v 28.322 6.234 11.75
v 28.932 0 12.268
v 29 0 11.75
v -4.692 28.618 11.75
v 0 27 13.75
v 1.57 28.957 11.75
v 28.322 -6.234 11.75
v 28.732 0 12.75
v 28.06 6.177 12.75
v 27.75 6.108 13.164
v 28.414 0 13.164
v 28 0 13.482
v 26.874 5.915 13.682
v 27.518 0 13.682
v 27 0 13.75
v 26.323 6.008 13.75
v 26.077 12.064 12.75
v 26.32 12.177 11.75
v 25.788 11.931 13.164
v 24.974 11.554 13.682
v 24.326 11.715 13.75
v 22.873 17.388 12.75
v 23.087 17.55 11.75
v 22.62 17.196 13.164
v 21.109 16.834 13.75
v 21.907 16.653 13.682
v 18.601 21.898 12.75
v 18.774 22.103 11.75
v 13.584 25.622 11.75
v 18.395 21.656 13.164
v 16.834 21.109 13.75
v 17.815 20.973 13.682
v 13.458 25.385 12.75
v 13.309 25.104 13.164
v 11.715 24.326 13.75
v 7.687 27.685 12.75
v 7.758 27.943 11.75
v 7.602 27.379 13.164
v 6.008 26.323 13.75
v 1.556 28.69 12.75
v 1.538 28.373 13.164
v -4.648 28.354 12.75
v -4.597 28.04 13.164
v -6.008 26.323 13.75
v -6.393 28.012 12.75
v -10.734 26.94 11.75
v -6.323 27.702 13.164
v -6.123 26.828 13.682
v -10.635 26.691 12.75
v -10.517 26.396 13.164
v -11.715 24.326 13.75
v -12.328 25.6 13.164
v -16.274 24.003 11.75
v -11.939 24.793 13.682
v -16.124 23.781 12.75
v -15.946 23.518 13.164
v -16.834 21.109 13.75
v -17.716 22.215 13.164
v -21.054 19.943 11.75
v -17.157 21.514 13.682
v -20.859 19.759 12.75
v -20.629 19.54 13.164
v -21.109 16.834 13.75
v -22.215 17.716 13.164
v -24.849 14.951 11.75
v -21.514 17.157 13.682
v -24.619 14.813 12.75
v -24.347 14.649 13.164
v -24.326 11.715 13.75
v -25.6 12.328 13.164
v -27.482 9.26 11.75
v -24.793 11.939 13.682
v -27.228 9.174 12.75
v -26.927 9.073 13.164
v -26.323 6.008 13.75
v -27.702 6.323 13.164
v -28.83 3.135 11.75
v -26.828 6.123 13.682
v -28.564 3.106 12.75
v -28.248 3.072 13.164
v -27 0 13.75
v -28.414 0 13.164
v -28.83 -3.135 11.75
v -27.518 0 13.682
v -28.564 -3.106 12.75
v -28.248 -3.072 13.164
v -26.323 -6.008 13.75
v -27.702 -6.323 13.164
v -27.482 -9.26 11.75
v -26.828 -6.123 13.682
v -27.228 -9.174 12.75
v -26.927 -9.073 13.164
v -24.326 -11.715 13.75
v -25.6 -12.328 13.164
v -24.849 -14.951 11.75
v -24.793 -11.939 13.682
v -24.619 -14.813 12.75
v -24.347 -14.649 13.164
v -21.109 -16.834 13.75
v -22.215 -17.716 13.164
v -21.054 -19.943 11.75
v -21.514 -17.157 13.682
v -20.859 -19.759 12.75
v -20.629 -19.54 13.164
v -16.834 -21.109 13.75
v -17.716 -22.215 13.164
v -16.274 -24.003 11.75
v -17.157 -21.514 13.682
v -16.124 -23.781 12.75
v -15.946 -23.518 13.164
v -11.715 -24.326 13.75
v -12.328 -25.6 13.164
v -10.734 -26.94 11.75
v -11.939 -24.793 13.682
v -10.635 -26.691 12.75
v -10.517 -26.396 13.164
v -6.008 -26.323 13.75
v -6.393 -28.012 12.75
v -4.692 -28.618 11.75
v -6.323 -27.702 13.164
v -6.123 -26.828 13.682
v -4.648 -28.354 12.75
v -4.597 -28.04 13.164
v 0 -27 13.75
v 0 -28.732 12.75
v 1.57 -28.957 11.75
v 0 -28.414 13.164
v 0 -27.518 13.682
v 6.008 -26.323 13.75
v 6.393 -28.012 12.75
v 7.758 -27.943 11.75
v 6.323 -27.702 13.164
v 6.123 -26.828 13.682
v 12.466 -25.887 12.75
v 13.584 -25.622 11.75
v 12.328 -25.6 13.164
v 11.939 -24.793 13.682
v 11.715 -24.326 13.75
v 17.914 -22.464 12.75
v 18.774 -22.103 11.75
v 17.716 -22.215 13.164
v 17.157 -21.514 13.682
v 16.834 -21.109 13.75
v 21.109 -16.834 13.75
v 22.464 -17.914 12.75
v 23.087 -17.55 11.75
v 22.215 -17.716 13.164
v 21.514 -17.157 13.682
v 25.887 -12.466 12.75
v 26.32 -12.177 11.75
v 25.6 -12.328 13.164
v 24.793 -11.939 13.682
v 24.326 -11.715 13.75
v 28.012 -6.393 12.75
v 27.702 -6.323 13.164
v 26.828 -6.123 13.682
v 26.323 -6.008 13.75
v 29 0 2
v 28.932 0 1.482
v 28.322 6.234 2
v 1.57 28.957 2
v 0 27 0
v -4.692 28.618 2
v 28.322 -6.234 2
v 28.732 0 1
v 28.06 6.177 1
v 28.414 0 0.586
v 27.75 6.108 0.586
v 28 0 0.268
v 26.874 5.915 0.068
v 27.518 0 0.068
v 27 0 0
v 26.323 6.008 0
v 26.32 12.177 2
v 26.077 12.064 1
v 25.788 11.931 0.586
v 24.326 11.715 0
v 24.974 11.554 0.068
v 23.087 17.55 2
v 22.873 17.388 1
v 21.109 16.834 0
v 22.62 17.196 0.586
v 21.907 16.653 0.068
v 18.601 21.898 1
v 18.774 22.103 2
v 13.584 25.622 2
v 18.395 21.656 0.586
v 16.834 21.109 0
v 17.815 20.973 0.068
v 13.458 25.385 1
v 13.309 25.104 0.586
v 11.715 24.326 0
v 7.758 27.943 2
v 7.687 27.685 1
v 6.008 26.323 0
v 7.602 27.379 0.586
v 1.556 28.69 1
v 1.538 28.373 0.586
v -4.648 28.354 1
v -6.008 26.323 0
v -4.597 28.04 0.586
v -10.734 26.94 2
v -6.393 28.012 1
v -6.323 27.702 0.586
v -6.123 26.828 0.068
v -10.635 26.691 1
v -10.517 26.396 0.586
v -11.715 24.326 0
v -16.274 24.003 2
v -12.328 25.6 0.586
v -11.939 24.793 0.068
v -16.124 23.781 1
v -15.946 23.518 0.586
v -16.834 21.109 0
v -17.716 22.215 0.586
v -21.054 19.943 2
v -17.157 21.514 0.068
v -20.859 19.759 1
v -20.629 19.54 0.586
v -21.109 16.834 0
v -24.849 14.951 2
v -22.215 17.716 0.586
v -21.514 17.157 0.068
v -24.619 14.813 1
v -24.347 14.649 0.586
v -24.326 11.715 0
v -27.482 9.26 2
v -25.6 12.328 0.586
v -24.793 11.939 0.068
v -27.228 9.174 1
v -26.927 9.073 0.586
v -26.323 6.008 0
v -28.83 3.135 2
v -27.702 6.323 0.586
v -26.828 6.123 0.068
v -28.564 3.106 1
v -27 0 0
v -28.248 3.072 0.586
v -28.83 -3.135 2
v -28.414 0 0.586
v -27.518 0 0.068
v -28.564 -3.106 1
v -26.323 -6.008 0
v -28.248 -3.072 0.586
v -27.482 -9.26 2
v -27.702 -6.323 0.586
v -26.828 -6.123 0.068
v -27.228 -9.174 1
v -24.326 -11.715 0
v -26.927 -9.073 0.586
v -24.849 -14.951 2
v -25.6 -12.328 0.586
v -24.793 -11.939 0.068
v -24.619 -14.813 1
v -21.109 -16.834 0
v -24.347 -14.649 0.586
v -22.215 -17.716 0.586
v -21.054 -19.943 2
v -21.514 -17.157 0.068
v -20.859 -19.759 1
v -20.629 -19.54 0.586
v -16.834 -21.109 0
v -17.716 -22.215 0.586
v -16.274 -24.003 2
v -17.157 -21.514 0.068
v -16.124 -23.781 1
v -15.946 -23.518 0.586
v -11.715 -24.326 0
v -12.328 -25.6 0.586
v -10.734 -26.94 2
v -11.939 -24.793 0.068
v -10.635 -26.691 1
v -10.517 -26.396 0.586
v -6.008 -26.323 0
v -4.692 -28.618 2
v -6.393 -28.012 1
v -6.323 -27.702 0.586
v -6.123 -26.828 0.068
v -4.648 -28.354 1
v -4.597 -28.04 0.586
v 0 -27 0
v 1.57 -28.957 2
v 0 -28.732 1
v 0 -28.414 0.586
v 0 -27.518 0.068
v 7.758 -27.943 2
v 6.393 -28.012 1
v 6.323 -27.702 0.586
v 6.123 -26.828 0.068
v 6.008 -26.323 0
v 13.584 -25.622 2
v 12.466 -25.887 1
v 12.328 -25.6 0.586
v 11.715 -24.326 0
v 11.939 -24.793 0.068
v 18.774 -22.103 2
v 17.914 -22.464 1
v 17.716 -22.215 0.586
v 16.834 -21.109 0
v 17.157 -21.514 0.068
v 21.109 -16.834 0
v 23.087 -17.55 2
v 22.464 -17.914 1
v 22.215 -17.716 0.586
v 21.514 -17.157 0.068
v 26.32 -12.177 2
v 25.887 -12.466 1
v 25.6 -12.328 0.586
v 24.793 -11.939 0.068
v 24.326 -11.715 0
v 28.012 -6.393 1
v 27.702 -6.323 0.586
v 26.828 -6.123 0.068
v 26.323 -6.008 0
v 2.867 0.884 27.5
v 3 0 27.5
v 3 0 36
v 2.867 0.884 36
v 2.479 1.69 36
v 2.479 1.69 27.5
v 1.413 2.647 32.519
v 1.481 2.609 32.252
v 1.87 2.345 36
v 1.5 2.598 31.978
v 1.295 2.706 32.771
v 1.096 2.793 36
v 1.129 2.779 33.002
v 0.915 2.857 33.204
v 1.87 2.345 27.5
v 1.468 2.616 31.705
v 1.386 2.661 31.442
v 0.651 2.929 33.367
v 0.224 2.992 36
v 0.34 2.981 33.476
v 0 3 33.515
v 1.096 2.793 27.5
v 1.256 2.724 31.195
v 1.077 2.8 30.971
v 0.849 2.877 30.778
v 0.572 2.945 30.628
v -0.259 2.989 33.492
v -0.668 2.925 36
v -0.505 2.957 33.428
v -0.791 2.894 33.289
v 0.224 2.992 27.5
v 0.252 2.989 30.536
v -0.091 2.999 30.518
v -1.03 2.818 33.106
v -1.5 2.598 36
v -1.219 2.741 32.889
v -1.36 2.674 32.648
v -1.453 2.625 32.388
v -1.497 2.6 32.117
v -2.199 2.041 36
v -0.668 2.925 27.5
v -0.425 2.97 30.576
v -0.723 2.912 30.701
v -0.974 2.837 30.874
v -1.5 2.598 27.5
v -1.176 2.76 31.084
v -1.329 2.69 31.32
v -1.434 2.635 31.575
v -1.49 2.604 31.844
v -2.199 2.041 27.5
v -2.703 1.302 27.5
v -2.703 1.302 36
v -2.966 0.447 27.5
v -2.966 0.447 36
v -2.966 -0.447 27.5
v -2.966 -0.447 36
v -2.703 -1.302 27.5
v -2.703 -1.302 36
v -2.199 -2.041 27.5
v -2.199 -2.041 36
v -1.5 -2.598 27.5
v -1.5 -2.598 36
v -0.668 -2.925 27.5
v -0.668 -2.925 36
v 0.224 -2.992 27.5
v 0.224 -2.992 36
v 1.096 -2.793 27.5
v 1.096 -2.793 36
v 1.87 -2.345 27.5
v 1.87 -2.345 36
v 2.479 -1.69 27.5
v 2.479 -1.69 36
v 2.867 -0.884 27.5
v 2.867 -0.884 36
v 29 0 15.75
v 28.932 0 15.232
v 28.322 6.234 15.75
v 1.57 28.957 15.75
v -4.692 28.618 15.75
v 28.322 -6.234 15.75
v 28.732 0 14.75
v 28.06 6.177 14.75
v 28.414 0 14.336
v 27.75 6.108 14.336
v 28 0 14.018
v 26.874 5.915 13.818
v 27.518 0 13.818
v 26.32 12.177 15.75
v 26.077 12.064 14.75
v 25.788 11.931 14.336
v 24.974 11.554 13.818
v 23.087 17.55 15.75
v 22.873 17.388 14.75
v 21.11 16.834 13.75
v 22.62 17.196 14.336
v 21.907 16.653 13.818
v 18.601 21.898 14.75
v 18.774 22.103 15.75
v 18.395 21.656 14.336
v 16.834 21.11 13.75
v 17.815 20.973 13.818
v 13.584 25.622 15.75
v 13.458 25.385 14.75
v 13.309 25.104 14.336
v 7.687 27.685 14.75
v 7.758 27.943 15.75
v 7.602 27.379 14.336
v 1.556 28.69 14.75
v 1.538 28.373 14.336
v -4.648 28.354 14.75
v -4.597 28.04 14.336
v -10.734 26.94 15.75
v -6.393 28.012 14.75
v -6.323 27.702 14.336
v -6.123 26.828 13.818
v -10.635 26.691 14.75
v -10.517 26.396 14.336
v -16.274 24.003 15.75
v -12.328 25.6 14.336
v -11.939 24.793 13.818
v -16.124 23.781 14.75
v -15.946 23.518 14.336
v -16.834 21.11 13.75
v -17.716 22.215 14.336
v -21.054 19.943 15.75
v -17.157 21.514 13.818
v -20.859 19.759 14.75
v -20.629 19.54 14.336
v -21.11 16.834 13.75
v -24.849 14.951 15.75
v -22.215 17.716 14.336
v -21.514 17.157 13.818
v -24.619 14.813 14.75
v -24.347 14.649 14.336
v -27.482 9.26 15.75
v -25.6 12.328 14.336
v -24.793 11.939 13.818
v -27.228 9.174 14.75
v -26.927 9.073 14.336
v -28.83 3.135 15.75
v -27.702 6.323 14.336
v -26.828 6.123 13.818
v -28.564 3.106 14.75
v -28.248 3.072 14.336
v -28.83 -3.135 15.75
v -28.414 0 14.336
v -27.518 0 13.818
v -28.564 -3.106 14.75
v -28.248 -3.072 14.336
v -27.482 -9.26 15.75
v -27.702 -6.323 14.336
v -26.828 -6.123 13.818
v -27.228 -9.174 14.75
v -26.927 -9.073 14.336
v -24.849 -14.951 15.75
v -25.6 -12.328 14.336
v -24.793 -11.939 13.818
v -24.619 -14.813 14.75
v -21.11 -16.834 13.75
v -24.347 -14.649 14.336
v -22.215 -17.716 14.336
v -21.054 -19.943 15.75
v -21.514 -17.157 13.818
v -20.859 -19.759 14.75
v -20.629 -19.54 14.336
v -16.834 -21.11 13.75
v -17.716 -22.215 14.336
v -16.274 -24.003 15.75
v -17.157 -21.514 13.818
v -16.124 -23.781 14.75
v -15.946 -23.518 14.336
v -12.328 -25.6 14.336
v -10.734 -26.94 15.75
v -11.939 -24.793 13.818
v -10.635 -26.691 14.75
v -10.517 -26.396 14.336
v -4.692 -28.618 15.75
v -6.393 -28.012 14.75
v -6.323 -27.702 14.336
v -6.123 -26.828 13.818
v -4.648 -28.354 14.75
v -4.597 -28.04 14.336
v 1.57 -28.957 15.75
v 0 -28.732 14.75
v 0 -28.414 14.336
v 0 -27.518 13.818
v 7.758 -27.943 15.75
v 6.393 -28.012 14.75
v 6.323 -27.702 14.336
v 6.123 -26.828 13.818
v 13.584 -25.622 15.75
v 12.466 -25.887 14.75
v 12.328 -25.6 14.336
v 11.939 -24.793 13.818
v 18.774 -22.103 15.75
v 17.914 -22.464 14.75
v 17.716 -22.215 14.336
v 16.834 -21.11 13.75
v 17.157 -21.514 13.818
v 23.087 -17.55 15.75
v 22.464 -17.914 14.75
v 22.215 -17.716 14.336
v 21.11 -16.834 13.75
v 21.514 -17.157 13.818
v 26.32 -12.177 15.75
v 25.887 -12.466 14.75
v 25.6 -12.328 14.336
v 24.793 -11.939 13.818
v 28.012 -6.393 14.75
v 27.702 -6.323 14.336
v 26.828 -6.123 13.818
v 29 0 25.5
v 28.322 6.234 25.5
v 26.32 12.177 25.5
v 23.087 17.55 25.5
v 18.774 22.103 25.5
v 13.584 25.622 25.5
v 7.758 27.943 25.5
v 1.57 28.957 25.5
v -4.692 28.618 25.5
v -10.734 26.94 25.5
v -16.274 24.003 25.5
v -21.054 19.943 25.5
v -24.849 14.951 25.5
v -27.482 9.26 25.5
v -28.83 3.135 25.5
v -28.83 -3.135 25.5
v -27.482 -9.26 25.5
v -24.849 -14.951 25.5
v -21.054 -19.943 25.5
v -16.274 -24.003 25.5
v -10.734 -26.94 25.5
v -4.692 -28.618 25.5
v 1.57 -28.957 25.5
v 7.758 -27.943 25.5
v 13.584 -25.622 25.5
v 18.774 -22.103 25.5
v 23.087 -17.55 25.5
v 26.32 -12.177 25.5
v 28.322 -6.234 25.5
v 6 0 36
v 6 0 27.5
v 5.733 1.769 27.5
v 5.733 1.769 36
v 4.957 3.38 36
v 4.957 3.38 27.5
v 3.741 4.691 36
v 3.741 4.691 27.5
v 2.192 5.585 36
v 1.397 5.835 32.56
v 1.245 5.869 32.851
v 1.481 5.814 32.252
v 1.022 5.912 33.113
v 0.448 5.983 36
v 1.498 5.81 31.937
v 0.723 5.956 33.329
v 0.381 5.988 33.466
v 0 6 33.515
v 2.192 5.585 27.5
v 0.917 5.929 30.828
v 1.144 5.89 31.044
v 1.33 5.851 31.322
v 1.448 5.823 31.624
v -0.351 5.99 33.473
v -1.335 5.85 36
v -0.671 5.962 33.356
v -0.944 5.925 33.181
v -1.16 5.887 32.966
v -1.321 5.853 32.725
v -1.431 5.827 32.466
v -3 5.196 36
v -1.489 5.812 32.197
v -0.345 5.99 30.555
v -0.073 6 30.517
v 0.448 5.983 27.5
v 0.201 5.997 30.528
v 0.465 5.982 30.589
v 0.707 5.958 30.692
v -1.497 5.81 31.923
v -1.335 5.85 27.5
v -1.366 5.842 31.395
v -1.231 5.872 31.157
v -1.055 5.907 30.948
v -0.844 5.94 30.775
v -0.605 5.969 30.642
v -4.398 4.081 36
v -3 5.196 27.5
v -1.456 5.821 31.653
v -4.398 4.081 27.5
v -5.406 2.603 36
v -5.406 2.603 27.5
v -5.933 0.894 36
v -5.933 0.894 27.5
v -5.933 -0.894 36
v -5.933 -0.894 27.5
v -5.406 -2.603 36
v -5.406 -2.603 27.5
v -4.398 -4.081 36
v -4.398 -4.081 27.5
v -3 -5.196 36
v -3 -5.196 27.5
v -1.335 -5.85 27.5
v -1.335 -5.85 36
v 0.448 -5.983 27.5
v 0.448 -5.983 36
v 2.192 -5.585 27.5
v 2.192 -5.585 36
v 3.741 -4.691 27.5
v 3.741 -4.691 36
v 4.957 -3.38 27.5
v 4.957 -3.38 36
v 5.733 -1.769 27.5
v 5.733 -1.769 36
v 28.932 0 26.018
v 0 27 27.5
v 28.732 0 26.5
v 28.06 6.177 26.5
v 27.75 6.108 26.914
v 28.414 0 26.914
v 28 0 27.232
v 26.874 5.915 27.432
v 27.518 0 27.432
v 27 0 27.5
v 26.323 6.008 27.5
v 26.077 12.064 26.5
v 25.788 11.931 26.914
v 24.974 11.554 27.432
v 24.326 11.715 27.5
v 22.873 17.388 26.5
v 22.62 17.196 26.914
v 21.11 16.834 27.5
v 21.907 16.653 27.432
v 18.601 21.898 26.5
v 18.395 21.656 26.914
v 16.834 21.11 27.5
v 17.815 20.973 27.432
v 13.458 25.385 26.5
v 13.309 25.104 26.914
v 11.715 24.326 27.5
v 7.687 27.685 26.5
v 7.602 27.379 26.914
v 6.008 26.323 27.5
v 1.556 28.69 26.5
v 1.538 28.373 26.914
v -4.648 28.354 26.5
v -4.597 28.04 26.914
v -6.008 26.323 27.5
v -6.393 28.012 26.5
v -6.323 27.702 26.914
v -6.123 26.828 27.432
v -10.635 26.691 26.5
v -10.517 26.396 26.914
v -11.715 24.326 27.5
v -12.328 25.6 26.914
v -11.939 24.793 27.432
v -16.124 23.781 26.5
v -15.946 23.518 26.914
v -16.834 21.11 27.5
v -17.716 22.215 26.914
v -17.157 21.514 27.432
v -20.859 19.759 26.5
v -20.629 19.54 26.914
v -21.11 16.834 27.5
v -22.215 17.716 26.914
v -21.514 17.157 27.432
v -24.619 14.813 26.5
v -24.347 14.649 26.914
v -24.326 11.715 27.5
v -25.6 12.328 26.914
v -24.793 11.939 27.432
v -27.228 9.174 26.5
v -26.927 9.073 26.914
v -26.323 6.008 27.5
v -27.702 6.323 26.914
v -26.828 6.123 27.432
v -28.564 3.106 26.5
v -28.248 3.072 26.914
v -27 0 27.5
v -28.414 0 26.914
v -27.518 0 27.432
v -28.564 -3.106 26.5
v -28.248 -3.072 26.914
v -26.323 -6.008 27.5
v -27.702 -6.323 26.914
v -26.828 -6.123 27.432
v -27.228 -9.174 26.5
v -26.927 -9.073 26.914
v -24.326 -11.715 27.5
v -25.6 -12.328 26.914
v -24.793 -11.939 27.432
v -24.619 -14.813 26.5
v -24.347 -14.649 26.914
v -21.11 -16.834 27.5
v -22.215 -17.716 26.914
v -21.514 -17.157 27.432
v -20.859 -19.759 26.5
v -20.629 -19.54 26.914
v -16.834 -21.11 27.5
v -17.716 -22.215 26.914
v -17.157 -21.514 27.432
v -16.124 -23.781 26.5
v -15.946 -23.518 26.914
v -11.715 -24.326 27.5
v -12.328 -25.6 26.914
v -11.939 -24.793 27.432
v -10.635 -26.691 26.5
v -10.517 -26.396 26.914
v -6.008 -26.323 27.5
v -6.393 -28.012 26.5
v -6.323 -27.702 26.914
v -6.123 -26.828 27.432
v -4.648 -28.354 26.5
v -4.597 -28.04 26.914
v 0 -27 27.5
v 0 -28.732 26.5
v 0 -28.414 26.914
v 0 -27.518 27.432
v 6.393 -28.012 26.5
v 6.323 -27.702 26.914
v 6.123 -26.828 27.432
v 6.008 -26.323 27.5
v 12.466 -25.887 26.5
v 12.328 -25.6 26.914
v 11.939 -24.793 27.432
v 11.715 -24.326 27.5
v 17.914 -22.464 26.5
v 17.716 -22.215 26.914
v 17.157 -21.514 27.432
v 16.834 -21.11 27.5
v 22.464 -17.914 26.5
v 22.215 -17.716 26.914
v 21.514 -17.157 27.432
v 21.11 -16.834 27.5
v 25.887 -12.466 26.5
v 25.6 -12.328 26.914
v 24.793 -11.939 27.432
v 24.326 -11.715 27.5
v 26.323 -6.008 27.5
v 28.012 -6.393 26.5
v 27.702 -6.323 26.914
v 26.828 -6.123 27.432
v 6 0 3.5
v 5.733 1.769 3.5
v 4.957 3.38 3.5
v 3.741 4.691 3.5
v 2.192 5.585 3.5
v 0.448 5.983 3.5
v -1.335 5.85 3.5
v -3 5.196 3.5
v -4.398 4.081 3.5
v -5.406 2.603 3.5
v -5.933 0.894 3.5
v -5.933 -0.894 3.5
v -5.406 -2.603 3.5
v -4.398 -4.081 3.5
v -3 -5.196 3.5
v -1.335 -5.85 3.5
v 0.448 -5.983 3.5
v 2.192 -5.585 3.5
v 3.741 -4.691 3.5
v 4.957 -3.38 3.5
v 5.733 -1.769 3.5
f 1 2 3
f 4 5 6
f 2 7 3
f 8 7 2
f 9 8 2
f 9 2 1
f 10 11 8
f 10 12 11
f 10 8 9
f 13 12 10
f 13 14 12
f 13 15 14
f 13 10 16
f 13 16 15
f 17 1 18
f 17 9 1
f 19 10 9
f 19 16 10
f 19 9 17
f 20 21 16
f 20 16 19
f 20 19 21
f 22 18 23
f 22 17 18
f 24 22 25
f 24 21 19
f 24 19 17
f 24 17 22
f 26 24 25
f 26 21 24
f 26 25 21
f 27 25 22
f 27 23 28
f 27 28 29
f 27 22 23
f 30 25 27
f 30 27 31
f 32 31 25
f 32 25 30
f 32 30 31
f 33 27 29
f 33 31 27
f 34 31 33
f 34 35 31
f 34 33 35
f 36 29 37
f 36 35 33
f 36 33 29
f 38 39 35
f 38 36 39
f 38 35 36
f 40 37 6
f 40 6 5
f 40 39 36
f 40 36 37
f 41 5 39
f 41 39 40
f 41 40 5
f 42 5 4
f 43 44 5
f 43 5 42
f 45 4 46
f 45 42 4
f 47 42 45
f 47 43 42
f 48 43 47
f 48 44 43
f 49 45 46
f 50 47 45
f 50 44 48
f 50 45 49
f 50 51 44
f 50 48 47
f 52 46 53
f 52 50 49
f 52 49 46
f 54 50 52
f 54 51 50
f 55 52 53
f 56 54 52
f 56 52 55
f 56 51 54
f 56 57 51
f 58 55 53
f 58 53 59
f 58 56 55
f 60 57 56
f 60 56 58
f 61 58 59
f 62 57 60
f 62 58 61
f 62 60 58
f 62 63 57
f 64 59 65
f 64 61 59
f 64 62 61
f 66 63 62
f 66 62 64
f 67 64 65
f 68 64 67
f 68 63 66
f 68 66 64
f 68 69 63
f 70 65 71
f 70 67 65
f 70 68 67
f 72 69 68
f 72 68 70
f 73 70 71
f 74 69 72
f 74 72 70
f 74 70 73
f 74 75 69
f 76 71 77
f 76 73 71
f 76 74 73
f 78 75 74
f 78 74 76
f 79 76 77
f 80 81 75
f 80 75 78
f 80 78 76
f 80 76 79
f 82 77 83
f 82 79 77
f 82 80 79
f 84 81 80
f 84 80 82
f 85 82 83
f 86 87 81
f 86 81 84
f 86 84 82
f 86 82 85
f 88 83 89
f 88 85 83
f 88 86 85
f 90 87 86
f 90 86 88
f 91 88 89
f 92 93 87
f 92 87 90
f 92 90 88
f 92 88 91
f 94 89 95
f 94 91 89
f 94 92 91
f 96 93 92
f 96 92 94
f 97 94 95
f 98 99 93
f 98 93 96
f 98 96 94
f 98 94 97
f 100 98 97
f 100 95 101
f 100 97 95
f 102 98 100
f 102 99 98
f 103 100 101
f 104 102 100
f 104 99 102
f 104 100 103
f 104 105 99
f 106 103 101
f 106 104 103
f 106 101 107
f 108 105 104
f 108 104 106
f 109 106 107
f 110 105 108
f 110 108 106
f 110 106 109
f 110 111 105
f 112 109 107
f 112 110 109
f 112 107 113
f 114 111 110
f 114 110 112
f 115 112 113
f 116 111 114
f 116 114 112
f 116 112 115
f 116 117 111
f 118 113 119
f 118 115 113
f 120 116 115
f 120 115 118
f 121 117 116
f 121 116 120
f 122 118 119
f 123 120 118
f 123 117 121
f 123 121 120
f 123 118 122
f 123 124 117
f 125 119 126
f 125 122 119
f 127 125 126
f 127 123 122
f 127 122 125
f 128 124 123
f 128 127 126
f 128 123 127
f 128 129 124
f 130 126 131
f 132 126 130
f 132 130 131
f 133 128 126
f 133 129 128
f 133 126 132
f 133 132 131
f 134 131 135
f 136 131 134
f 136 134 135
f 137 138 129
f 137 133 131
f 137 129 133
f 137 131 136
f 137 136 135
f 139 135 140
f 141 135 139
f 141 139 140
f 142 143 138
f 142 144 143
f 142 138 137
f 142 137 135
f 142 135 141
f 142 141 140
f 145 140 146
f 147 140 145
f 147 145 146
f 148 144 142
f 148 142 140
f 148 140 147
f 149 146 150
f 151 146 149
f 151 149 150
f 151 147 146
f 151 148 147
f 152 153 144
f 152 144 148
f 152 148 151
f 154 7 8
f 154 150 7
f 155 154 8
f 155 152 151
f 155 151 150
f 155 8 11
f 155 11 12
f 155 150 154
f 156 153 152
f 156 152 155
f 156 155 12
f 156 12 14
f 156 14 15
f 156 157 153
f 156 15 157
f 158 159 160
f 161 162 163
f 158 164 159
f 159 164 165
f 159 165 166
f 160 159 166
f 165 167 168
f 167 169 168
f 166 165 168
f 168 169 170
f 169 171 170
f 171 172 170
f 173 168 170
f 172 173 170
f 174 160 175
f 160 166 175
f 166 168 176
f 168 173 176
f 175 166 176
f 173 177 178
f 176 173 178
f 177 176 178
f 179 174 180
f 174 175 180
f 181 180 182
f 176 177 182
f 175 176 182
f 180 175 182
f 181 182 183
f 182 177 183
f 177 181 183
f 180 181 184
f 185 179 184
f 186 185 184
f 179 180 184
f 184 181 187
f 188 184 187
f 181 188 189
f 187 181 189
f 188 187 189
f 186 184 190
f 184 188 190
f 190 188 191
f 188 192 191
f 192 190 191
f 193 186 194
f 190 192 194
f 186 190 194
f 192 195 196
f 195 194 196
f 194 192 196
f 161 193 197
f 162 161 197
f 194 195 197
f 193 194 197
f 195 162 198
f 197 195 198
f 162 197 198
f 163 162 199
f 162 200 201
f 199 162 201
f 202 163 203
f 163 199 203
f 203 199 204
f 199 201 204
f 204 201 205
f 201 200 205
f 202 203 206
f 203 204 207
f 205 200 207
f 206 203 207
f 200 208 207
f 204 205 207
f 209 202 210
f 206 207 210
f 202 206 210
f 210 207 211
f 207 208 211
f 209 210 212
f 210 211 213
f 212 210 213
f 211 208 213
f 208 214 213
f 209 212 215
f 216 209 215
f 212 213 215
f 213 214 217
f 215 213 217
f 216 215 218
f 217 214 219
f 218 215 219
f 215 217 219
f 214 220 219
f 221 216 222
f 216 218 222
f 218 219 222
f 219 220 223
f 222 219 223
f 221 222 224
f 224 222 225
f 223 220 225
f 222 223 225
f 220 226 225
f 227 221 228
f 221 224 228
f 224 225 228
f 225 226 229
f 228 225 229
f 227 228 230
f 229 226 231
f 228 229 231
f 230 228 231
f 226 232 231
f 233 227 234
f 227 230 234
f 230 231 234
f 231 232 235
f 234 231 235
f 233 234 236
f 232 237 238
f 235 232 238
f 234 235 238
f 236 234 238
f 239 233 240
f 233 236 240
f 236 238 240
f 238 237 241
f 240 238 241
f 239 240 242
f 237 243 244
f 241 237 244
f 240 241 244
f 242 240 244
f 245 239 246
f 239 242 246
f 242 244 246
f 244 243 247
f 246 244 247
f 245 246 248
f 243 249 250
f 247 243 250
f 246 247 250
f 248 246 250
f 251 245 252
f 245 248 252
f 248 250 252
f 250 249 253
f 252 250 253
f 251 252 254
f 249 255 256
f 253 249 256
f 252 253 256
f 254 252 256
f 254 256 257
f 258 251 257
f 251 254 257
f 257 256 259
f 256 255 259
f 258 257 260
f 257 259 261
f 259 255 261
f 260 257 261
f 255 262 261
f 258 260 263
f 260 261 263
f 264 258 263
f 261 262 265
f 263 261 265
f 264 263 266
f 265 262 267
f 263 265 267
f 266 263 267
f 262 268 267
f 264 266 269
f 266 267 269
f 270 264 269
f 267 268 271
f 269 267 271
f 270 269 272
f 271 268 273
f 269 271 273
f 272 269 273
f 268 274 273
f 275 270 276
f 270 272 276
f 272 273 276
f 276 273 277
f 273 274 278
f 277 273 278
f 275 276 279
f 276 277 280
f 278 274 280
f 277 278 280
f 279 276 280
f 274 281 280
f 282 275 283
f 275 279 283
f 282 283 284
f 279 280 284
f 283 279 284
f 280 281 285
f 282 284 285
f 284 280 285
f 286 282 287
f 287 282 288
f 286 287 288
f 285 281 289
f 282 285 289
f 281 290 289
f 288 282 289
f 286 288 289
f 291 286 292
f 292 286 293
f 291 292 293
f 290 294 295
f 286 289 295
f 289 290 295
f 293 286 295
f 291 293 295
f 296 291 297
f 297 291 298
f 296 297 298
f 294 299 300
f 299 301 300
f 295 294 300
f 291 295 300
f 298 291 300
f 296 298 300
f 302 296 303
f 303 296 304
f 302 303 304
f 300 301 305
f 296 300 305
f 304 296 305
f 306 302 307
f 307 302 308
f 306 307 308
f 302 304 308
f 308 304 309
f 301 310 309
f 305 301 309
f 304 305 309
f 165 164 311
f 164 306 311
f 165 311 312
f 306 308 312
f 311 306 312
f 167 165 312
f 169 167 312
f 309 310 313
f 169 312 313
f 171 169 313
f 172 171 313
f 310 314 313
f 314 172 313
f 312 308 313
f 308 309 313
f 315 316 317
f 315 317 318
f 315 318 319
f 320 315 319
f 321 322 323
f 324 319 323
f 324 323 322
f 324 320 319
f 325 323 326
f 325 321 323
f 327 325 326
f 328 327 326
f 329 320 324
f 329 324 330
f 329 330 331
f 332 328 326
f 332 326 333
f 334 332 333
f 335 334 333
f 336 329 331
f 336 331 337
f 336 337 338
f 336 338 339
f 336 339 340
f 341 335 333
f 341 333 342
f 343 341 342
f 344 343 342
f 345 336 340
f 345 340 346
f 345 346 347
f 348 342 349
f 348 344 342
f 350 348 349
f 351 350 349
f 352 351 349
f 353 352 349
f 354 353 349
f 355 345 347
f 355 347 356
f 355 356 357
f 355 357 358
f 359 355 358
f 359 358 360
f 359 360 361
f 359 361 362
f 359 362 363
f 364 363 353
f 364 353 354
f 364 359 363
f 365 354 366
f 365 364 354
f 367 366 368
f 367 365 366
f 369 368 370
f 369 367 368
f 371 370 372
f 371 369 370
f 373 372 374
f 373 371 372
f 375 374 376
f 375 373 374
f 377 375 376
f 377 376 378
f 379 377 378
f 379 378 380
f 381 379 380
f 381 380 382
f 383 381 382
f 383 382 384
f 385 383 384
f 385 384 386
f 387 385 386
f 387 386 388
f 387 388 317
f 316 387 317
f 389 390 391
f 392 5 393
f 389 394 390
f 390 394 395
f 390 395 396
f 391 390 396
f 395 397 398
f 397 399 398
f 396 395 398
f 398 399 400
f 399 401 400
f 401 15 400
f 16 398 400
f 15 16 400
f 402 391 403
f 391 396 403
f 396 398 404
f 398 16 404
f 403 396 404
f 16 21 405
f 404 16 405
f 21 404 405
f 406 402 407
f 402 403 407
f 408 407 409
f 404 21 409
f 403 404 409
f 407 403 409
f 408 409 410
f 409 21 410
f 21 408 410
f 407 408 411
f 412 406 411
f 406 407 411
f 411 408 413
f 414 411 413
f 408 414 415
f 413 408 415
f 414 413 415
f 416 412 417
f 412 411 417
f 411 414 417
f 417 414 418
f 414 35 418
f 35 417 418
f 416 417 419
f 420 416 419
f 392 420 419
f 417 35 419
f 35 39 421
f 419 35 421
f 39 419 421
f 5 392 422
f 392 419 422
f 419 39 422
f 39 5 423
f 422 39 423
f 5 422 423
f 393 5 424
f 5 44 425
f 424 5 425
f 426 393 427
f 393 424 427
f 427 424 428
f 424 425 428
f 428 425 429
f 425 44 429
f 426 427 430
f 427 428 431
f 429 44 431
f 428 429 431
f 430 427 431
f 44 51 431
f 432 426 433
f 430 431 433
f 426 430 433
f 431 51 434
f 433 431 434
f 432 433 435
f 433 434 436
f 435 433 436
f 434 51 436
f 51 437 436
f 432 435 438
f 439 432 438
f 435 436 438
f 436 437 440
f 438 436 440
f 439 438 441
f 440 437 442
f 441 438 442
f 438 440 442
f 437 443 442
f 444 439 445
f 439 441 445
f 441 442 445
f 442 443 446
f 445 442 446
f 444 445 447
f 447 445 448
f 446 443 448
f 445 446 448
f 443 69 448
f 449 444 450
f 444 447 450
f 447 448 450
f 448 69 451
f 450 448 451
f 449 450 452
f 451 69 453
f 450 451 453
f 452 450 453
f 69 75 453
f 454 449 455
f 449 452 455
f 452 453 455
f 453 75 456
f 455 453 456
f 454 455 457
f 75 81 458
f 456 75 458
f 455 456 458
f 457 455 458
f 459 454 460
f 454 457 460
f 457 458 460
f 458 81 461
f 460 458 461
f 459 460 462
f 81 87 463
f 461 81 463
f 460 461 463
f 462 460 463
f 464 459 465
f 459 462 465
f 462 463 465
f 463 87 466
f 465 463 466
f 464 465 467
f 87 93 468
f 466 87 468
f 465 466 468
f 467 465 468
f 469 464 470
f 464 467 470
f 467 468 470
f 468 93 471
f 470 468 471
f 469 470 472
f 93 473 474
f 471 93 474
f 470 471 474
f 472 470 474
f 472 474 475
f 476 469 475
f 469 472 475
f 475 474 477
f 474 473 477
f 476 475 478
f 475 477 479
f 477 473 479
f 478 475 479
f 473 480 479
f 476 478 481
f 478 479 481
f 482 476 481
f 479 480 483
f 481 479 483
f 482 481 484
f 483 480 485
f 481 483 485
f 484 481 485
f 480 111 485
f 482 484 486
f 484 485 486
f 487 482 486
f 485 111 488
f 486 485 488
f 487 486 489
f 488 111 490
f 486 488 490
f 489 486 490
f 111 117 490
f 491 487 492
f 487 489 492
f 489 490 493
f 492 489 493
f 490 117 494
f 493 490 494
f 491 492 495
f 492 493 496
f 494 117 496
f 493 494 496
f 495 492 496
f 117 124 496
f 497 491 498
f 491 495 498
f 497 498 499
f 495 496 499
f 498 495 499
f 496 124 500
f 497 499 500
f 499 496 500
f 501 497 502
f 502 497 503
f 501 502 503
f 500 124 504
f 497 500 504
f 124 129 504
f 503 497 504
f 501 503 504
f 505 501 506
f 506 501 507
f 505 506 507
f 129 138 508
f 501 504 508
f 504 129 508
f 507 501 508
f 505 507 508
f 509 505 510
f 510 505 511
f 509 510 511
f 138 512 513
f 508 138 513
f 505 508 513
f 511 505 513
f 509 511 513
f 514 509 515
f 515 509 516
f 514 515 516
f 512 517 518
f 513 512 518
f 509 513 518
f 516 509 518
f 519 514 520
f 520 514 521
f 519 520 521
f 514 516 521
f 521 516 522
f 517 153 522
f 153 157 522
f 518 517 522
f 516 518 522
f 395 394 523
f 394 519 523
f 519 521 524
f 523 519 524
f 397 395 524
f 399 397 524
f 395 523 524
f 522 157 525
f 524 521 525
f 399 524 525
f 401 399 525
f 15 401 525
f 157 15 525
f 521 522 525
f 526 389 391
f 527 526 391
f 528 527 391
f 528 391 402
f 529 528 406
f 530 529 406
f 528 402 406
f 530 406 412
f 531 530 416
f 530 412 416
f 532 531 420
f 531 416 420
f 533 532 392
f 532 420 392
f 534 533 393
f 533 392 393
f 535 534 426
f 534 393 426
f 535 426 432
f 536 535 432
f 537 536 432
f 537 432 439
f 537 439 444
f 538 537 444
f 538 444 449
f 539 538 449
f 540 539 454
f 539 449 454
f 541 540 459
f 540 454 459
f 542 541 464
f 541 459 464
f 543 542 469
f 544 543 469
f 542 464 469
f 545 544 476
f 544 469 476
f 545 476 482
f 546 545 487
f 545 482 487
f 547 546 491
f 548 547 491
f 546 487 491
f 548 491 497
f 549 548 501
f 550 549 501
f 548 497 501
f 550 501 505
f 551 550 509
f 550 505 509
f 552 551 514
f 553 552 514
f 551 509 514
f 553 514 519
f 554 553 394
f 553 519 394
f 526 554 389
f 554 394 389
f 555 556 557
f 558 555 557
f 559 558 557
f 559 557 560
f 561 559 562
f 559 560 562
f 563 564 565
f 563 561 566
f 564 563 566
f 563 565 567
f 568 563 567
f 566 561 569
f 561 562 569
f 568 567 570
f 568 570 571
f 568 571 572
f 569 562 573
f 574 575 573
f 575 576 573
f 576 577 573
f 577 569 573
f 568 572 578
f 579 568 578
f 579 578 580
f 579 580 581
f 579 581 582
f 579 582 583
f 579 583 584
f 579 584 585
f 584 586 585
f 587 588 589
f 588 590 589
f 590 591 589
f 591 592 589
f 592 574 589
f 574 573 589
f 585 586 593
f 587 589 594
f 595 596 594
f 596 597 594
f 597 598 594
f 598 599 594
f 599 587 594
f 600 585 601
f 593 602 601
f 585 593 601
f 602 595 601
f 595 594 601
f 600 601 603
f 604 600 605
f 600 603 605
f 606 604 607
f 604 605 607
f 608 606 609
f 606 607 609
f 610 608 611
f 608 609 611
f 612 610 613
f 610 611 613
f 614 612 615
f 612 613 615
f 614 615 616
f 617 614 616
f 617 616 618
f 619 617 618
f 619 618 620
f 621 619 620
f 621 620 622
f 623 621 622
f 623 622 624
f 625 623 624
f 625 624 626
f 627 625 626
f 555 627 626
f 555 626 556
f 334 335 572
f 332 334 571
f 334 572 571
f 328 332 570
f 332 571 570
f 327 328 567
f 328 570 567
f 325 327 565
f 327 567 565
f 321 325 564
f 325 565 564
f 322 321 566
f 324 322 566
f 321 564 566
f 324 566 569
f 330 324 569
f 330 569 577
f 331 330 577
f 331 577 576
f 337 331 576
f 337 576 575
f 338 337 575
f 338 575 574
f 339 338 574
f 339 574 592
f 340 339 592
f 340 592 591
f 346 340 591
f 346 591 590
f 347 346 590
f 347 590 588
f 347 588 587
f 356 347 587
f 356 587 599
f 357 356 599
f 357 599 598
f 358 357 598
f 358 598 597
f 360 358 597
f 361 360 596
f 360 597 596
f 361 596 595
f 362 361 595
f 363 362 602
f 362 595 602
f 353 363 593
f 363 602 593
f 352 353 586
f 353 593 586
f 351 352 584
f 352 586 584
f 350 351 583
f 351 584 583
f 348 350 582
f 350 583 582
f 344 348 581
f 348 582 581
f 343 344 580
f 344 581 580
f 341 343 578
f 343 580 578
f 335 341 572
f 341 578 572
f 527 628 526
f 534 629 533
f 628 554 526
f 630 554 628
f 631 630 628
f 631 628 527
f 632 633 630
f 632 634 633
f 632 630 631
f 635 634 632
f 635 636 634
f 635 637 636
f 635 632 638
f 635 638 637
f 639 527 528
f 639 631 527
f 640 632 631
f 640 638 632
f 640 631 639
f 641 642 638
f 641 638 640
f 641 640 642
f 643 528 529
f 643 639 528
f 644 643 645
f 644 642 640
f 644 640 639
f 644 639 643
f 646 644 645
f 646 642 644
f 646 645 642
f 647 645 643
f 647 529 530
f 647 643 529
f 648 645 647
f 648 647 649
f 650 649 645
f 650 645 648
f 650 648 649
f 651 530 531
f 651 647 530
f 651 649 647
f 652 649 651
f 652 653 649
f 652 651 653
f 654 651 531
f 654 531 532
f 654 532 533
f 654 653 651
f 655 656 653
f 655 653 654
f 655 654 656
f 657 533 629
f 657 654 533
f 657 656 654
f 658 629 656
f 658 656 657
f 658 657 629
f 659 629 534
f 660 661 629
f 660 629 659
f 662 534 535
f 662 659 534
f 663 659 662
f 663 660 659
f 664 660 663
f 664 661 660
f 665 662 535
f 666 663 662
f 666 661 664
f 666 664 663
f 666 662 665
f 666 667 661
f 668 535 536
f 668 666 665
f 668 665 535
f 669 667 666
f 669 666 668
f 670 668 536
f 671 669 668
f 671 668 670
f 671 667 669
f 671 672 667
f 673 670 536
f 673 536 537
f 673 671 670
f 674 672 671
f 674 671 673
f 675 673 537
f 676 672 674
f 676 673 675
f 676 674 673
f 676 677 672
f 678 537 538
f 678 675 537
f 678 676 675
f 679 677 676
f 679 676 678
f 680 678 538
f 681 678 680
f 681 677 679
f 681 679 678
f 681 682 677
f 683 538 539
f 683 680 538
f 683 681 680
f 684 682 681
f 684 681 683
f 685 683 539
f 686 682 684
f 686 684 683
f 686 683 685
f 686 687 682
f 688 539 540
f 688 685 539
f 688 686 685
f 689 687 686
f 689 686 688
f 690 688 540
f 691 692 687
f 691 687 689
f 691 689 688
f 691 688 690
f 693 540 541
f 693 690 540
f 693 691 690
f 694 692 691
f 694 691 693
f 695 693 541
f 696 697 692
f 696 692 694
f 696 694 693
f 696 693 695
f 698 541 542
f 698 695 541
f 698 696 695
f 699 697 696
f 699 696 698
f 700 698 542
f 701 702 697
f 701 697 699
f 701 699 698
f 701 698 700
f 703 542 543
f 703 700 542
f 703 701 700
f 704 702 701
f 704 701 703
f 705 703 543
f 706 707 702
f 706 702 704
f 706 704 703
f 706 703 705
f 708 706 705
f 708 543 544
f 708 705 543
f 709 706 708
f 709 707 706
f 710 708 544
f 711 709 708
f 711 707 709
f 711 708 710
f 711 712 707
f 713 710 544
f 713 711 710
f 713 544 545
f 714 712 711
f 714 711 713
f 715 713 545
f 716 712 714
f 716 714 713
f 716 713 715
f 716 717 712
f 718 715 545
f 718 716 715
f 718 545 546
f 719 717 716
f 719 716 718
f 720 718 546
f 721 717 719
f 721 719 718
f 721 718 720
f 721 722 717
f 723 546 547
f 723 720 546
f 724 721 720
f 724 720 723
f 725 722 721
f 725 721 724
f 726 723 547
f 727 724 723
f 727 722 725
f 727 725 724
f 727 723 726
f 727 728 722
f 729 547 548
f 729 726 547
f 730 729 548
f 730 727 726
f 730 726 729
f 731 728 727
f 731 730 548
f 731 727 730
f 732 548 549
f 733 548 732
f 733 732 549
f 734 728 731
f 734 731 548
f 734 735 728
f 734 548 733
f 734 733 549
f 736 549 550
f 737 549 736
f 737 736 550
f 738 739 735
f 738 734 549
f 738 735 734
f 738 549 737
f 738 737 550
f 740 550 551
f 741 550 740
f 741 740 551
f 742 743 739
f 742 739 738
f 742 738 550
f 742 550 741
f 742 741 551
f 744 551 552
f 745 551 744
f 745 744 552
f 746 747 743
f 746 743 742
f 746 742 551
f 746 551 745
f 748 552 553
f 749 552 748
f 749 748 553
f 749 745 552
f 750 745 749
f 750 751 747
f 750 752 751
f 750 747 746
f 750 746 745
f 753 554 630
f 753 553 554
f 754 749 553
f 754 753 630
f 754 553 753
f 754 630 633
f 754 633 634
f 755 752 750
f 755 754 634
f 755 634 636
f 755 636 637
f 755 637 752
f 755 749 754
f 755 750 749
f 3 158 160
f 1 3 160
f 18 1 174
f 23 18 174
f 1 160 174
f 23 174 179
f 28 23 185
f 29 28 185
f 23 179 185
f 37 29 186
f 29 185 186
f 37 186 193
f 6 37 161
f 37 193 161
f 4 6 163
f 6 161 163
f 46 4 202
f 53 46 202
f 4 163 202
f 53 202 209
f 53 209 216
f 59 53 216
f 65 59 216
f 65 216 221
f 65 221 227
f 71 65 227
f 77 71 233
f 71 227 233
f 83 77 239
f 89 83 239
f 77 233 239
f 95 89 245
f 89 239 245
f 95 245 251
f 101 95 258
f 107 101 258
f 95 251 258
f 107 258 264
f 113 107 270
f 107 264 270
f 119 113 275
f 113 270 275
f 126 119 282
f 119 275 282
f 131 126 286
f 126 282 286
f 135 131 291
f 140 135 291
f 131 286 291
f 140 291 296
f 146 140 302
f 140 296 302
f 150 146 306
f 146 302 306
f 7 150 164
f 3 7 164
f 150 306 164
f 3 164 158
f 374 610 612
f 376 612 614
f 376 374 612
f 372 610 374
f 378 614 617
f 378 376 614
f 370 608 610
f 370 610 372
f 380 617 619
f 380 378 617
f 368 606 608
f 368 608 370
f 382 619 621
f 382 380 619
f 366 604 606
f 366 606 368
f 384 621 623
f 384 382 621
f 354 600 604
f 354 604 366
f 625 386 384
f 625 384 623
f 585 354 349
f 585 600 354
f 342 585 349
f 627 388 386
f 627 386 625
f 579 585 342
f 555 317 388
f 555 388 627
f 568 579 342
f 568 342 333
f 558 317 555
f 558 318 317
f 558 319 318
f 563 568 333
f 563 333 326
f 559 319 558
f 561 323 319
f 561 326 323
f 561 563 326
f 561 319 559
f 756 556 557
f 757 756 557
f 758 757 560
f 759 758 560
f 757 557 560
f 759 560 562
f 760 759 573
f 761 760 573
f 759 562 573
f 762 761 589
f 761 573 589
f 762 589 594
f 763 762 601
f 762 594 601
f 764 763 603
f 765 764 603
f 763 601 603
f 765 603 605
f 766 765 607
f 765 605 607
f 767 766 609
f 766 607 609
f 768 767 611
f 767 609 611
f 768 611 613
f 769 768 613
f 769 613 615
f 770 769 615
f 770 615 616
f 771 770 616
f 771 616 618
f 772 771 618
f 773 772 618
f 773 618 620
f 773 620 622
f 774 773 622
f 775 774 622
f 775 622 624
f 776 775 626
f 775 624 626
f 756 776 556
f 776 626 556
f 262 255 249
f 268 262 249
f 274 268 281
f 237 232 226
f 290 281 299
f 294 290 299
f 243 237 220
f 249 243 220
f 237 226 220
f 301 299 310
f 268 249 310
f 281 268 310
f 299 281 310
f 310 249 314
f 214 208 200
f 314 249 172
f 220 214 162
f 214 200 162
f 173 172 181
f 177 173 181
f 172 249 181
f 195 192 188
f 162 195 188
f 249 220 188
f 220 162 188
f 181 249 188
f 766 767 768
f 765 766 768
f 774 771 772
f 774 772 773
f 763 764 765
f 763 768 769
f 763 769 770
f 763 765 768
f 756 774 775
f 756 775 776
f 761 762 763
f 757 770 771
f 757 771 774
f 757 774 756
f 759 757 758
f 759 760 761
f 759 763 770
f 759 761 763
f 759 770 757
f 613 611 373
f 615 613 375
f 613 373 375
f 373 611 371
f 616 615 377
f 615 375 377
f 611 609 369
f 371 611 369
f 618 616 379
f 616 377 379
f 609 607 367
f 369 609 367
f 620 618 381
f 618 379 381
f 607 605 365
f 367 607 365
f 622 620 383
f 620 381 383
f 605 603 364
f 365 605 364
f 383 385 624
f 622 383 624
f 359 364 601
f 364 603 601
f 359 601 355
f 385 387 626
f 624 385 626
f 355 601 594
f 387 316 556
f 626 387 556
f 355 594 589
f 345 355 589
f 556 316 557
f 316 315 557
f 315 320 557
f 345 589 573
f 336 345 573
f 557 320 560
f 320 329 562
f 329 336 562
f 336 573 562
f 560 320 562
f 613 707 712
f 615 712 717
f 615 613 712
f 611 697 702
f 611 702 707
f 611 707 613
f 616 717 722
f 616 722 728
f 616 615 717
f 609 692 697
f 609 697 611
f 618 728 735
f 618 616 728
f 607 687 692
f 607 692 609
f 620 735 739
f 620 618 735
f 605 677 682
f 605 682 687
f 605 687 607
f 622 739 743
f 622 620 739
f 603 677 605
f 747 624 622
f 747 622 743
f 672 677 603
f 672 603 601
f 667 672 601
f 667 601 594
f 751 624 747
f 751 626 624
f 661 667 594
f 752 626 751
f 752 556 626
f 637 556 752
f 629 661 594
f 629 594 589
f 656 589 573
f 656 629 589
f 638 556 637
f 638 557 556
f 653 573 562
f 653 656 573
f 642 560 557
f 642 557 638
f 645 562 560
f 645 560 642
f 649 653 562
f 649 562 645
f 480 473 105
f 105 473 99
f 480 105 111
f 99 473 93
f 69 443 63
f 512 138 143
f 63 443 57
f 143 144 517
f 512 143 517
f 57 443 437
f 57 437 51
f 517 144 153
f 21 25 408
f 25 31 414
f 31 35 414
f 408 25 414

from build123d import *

# Parameters (mm, degrees)
SKETCH_1_R          = 29
EXTRUDE_1_DEPTH     = 13.75
FILLET_1_R          = 2
FILLET_2_R          = 2
SKETCH_2_R          = 29
EXTRUDE_2_DEPTH     = 13.75
FILLET_3_R          = 2
SKETCH_4_R          = 6
CUT_EXTRUDE_1_DEPTH = 24
SKETCH_10_R         = 6
SKETCH_10_R_2       = 3
EXTRUDE_3_DEPTH     = 8.5
SKETCH_11_R         = 1.5
CUT_EXTRUDE_2_DEPTH = 5


with BuildPart() as part:
    # 草图1 → 凸台-拉伸1 (new body)
    with BuildSketch(Plane.XY):
        Circle(SKETCH_1_R)
    extrude(amount=EXTRUDE_1_DEPTH)

    # 圆角1
    fillet_1_edges = [part.edges().sort_by_distance(p)[0] for p in [
        (-29, 0, 13.75),
    ]]
    fillet(fillet_1_edges, radius=FILLET_1_R)

    # 圆角2
    fillet_2_edges = [part.edges().sort_by_distance(p)[0] for p in [
        (-29, 0, 0),
    ]]
    fillet(fillet_2_edges, radius=FILLET_2_R)

    # 草图2 → 凸台-拉伸2 (add)
    with BuildSketch(Plane.XY.offset(13.75)):
        Circle(SKETCH_2_R)
    extrude(amount=EXTRUDE_2_DEPTH)

    # 圆角3
    fillet_3_edges = [part.edges().sort_by_distance(p)[0] for p in [
        (-29, 0, 13.75),
        (-29, 0, 27.5),
    ]]
    fillet(fillet_3_edges, radius=FILLET_3_R - 0.0001)  # a hair under: the kernel refuses the full size

    # 草图4 → 切除-拉伸1 (cut)
    with BuildSketch(Plane.XY.offset(27.5)):
        Circle(SKETCH_4_R)
    extrude(amount=-CUT_EXTRUDE_1_DEPTH, mode=Mode.SUBTRACT)


with BuildPart() as body_2:
    # 草图10 → 凸台-拉伸3 (new body)
    with BuildSketch(Plane.XY.offset(27.5)):
        Circle(SKETCH_10_R)
        Circle(SKETCH_10_R_2, mode=Mode.SUBTRACT)
    extrude(amount=EXTRUDE_3_DEPTH)

    # 草图11 → 切除-拉伸2 (cut)
    with BuildSketch(Plane(origin=(0, 6, 0), x_dir=(1, 0, 0), z_dir=(0, 1, 0))):
        with Locations(Location((0, -32.015019556, 0), (0, 0, 270))):
            Circle(SKETCH_11_R)
    extrude(amount=-CUT_EXTRUDE_2_DEPTH, mode=Mode.SUBTRACT)


solid = Compound([part.part, body_2.part])
